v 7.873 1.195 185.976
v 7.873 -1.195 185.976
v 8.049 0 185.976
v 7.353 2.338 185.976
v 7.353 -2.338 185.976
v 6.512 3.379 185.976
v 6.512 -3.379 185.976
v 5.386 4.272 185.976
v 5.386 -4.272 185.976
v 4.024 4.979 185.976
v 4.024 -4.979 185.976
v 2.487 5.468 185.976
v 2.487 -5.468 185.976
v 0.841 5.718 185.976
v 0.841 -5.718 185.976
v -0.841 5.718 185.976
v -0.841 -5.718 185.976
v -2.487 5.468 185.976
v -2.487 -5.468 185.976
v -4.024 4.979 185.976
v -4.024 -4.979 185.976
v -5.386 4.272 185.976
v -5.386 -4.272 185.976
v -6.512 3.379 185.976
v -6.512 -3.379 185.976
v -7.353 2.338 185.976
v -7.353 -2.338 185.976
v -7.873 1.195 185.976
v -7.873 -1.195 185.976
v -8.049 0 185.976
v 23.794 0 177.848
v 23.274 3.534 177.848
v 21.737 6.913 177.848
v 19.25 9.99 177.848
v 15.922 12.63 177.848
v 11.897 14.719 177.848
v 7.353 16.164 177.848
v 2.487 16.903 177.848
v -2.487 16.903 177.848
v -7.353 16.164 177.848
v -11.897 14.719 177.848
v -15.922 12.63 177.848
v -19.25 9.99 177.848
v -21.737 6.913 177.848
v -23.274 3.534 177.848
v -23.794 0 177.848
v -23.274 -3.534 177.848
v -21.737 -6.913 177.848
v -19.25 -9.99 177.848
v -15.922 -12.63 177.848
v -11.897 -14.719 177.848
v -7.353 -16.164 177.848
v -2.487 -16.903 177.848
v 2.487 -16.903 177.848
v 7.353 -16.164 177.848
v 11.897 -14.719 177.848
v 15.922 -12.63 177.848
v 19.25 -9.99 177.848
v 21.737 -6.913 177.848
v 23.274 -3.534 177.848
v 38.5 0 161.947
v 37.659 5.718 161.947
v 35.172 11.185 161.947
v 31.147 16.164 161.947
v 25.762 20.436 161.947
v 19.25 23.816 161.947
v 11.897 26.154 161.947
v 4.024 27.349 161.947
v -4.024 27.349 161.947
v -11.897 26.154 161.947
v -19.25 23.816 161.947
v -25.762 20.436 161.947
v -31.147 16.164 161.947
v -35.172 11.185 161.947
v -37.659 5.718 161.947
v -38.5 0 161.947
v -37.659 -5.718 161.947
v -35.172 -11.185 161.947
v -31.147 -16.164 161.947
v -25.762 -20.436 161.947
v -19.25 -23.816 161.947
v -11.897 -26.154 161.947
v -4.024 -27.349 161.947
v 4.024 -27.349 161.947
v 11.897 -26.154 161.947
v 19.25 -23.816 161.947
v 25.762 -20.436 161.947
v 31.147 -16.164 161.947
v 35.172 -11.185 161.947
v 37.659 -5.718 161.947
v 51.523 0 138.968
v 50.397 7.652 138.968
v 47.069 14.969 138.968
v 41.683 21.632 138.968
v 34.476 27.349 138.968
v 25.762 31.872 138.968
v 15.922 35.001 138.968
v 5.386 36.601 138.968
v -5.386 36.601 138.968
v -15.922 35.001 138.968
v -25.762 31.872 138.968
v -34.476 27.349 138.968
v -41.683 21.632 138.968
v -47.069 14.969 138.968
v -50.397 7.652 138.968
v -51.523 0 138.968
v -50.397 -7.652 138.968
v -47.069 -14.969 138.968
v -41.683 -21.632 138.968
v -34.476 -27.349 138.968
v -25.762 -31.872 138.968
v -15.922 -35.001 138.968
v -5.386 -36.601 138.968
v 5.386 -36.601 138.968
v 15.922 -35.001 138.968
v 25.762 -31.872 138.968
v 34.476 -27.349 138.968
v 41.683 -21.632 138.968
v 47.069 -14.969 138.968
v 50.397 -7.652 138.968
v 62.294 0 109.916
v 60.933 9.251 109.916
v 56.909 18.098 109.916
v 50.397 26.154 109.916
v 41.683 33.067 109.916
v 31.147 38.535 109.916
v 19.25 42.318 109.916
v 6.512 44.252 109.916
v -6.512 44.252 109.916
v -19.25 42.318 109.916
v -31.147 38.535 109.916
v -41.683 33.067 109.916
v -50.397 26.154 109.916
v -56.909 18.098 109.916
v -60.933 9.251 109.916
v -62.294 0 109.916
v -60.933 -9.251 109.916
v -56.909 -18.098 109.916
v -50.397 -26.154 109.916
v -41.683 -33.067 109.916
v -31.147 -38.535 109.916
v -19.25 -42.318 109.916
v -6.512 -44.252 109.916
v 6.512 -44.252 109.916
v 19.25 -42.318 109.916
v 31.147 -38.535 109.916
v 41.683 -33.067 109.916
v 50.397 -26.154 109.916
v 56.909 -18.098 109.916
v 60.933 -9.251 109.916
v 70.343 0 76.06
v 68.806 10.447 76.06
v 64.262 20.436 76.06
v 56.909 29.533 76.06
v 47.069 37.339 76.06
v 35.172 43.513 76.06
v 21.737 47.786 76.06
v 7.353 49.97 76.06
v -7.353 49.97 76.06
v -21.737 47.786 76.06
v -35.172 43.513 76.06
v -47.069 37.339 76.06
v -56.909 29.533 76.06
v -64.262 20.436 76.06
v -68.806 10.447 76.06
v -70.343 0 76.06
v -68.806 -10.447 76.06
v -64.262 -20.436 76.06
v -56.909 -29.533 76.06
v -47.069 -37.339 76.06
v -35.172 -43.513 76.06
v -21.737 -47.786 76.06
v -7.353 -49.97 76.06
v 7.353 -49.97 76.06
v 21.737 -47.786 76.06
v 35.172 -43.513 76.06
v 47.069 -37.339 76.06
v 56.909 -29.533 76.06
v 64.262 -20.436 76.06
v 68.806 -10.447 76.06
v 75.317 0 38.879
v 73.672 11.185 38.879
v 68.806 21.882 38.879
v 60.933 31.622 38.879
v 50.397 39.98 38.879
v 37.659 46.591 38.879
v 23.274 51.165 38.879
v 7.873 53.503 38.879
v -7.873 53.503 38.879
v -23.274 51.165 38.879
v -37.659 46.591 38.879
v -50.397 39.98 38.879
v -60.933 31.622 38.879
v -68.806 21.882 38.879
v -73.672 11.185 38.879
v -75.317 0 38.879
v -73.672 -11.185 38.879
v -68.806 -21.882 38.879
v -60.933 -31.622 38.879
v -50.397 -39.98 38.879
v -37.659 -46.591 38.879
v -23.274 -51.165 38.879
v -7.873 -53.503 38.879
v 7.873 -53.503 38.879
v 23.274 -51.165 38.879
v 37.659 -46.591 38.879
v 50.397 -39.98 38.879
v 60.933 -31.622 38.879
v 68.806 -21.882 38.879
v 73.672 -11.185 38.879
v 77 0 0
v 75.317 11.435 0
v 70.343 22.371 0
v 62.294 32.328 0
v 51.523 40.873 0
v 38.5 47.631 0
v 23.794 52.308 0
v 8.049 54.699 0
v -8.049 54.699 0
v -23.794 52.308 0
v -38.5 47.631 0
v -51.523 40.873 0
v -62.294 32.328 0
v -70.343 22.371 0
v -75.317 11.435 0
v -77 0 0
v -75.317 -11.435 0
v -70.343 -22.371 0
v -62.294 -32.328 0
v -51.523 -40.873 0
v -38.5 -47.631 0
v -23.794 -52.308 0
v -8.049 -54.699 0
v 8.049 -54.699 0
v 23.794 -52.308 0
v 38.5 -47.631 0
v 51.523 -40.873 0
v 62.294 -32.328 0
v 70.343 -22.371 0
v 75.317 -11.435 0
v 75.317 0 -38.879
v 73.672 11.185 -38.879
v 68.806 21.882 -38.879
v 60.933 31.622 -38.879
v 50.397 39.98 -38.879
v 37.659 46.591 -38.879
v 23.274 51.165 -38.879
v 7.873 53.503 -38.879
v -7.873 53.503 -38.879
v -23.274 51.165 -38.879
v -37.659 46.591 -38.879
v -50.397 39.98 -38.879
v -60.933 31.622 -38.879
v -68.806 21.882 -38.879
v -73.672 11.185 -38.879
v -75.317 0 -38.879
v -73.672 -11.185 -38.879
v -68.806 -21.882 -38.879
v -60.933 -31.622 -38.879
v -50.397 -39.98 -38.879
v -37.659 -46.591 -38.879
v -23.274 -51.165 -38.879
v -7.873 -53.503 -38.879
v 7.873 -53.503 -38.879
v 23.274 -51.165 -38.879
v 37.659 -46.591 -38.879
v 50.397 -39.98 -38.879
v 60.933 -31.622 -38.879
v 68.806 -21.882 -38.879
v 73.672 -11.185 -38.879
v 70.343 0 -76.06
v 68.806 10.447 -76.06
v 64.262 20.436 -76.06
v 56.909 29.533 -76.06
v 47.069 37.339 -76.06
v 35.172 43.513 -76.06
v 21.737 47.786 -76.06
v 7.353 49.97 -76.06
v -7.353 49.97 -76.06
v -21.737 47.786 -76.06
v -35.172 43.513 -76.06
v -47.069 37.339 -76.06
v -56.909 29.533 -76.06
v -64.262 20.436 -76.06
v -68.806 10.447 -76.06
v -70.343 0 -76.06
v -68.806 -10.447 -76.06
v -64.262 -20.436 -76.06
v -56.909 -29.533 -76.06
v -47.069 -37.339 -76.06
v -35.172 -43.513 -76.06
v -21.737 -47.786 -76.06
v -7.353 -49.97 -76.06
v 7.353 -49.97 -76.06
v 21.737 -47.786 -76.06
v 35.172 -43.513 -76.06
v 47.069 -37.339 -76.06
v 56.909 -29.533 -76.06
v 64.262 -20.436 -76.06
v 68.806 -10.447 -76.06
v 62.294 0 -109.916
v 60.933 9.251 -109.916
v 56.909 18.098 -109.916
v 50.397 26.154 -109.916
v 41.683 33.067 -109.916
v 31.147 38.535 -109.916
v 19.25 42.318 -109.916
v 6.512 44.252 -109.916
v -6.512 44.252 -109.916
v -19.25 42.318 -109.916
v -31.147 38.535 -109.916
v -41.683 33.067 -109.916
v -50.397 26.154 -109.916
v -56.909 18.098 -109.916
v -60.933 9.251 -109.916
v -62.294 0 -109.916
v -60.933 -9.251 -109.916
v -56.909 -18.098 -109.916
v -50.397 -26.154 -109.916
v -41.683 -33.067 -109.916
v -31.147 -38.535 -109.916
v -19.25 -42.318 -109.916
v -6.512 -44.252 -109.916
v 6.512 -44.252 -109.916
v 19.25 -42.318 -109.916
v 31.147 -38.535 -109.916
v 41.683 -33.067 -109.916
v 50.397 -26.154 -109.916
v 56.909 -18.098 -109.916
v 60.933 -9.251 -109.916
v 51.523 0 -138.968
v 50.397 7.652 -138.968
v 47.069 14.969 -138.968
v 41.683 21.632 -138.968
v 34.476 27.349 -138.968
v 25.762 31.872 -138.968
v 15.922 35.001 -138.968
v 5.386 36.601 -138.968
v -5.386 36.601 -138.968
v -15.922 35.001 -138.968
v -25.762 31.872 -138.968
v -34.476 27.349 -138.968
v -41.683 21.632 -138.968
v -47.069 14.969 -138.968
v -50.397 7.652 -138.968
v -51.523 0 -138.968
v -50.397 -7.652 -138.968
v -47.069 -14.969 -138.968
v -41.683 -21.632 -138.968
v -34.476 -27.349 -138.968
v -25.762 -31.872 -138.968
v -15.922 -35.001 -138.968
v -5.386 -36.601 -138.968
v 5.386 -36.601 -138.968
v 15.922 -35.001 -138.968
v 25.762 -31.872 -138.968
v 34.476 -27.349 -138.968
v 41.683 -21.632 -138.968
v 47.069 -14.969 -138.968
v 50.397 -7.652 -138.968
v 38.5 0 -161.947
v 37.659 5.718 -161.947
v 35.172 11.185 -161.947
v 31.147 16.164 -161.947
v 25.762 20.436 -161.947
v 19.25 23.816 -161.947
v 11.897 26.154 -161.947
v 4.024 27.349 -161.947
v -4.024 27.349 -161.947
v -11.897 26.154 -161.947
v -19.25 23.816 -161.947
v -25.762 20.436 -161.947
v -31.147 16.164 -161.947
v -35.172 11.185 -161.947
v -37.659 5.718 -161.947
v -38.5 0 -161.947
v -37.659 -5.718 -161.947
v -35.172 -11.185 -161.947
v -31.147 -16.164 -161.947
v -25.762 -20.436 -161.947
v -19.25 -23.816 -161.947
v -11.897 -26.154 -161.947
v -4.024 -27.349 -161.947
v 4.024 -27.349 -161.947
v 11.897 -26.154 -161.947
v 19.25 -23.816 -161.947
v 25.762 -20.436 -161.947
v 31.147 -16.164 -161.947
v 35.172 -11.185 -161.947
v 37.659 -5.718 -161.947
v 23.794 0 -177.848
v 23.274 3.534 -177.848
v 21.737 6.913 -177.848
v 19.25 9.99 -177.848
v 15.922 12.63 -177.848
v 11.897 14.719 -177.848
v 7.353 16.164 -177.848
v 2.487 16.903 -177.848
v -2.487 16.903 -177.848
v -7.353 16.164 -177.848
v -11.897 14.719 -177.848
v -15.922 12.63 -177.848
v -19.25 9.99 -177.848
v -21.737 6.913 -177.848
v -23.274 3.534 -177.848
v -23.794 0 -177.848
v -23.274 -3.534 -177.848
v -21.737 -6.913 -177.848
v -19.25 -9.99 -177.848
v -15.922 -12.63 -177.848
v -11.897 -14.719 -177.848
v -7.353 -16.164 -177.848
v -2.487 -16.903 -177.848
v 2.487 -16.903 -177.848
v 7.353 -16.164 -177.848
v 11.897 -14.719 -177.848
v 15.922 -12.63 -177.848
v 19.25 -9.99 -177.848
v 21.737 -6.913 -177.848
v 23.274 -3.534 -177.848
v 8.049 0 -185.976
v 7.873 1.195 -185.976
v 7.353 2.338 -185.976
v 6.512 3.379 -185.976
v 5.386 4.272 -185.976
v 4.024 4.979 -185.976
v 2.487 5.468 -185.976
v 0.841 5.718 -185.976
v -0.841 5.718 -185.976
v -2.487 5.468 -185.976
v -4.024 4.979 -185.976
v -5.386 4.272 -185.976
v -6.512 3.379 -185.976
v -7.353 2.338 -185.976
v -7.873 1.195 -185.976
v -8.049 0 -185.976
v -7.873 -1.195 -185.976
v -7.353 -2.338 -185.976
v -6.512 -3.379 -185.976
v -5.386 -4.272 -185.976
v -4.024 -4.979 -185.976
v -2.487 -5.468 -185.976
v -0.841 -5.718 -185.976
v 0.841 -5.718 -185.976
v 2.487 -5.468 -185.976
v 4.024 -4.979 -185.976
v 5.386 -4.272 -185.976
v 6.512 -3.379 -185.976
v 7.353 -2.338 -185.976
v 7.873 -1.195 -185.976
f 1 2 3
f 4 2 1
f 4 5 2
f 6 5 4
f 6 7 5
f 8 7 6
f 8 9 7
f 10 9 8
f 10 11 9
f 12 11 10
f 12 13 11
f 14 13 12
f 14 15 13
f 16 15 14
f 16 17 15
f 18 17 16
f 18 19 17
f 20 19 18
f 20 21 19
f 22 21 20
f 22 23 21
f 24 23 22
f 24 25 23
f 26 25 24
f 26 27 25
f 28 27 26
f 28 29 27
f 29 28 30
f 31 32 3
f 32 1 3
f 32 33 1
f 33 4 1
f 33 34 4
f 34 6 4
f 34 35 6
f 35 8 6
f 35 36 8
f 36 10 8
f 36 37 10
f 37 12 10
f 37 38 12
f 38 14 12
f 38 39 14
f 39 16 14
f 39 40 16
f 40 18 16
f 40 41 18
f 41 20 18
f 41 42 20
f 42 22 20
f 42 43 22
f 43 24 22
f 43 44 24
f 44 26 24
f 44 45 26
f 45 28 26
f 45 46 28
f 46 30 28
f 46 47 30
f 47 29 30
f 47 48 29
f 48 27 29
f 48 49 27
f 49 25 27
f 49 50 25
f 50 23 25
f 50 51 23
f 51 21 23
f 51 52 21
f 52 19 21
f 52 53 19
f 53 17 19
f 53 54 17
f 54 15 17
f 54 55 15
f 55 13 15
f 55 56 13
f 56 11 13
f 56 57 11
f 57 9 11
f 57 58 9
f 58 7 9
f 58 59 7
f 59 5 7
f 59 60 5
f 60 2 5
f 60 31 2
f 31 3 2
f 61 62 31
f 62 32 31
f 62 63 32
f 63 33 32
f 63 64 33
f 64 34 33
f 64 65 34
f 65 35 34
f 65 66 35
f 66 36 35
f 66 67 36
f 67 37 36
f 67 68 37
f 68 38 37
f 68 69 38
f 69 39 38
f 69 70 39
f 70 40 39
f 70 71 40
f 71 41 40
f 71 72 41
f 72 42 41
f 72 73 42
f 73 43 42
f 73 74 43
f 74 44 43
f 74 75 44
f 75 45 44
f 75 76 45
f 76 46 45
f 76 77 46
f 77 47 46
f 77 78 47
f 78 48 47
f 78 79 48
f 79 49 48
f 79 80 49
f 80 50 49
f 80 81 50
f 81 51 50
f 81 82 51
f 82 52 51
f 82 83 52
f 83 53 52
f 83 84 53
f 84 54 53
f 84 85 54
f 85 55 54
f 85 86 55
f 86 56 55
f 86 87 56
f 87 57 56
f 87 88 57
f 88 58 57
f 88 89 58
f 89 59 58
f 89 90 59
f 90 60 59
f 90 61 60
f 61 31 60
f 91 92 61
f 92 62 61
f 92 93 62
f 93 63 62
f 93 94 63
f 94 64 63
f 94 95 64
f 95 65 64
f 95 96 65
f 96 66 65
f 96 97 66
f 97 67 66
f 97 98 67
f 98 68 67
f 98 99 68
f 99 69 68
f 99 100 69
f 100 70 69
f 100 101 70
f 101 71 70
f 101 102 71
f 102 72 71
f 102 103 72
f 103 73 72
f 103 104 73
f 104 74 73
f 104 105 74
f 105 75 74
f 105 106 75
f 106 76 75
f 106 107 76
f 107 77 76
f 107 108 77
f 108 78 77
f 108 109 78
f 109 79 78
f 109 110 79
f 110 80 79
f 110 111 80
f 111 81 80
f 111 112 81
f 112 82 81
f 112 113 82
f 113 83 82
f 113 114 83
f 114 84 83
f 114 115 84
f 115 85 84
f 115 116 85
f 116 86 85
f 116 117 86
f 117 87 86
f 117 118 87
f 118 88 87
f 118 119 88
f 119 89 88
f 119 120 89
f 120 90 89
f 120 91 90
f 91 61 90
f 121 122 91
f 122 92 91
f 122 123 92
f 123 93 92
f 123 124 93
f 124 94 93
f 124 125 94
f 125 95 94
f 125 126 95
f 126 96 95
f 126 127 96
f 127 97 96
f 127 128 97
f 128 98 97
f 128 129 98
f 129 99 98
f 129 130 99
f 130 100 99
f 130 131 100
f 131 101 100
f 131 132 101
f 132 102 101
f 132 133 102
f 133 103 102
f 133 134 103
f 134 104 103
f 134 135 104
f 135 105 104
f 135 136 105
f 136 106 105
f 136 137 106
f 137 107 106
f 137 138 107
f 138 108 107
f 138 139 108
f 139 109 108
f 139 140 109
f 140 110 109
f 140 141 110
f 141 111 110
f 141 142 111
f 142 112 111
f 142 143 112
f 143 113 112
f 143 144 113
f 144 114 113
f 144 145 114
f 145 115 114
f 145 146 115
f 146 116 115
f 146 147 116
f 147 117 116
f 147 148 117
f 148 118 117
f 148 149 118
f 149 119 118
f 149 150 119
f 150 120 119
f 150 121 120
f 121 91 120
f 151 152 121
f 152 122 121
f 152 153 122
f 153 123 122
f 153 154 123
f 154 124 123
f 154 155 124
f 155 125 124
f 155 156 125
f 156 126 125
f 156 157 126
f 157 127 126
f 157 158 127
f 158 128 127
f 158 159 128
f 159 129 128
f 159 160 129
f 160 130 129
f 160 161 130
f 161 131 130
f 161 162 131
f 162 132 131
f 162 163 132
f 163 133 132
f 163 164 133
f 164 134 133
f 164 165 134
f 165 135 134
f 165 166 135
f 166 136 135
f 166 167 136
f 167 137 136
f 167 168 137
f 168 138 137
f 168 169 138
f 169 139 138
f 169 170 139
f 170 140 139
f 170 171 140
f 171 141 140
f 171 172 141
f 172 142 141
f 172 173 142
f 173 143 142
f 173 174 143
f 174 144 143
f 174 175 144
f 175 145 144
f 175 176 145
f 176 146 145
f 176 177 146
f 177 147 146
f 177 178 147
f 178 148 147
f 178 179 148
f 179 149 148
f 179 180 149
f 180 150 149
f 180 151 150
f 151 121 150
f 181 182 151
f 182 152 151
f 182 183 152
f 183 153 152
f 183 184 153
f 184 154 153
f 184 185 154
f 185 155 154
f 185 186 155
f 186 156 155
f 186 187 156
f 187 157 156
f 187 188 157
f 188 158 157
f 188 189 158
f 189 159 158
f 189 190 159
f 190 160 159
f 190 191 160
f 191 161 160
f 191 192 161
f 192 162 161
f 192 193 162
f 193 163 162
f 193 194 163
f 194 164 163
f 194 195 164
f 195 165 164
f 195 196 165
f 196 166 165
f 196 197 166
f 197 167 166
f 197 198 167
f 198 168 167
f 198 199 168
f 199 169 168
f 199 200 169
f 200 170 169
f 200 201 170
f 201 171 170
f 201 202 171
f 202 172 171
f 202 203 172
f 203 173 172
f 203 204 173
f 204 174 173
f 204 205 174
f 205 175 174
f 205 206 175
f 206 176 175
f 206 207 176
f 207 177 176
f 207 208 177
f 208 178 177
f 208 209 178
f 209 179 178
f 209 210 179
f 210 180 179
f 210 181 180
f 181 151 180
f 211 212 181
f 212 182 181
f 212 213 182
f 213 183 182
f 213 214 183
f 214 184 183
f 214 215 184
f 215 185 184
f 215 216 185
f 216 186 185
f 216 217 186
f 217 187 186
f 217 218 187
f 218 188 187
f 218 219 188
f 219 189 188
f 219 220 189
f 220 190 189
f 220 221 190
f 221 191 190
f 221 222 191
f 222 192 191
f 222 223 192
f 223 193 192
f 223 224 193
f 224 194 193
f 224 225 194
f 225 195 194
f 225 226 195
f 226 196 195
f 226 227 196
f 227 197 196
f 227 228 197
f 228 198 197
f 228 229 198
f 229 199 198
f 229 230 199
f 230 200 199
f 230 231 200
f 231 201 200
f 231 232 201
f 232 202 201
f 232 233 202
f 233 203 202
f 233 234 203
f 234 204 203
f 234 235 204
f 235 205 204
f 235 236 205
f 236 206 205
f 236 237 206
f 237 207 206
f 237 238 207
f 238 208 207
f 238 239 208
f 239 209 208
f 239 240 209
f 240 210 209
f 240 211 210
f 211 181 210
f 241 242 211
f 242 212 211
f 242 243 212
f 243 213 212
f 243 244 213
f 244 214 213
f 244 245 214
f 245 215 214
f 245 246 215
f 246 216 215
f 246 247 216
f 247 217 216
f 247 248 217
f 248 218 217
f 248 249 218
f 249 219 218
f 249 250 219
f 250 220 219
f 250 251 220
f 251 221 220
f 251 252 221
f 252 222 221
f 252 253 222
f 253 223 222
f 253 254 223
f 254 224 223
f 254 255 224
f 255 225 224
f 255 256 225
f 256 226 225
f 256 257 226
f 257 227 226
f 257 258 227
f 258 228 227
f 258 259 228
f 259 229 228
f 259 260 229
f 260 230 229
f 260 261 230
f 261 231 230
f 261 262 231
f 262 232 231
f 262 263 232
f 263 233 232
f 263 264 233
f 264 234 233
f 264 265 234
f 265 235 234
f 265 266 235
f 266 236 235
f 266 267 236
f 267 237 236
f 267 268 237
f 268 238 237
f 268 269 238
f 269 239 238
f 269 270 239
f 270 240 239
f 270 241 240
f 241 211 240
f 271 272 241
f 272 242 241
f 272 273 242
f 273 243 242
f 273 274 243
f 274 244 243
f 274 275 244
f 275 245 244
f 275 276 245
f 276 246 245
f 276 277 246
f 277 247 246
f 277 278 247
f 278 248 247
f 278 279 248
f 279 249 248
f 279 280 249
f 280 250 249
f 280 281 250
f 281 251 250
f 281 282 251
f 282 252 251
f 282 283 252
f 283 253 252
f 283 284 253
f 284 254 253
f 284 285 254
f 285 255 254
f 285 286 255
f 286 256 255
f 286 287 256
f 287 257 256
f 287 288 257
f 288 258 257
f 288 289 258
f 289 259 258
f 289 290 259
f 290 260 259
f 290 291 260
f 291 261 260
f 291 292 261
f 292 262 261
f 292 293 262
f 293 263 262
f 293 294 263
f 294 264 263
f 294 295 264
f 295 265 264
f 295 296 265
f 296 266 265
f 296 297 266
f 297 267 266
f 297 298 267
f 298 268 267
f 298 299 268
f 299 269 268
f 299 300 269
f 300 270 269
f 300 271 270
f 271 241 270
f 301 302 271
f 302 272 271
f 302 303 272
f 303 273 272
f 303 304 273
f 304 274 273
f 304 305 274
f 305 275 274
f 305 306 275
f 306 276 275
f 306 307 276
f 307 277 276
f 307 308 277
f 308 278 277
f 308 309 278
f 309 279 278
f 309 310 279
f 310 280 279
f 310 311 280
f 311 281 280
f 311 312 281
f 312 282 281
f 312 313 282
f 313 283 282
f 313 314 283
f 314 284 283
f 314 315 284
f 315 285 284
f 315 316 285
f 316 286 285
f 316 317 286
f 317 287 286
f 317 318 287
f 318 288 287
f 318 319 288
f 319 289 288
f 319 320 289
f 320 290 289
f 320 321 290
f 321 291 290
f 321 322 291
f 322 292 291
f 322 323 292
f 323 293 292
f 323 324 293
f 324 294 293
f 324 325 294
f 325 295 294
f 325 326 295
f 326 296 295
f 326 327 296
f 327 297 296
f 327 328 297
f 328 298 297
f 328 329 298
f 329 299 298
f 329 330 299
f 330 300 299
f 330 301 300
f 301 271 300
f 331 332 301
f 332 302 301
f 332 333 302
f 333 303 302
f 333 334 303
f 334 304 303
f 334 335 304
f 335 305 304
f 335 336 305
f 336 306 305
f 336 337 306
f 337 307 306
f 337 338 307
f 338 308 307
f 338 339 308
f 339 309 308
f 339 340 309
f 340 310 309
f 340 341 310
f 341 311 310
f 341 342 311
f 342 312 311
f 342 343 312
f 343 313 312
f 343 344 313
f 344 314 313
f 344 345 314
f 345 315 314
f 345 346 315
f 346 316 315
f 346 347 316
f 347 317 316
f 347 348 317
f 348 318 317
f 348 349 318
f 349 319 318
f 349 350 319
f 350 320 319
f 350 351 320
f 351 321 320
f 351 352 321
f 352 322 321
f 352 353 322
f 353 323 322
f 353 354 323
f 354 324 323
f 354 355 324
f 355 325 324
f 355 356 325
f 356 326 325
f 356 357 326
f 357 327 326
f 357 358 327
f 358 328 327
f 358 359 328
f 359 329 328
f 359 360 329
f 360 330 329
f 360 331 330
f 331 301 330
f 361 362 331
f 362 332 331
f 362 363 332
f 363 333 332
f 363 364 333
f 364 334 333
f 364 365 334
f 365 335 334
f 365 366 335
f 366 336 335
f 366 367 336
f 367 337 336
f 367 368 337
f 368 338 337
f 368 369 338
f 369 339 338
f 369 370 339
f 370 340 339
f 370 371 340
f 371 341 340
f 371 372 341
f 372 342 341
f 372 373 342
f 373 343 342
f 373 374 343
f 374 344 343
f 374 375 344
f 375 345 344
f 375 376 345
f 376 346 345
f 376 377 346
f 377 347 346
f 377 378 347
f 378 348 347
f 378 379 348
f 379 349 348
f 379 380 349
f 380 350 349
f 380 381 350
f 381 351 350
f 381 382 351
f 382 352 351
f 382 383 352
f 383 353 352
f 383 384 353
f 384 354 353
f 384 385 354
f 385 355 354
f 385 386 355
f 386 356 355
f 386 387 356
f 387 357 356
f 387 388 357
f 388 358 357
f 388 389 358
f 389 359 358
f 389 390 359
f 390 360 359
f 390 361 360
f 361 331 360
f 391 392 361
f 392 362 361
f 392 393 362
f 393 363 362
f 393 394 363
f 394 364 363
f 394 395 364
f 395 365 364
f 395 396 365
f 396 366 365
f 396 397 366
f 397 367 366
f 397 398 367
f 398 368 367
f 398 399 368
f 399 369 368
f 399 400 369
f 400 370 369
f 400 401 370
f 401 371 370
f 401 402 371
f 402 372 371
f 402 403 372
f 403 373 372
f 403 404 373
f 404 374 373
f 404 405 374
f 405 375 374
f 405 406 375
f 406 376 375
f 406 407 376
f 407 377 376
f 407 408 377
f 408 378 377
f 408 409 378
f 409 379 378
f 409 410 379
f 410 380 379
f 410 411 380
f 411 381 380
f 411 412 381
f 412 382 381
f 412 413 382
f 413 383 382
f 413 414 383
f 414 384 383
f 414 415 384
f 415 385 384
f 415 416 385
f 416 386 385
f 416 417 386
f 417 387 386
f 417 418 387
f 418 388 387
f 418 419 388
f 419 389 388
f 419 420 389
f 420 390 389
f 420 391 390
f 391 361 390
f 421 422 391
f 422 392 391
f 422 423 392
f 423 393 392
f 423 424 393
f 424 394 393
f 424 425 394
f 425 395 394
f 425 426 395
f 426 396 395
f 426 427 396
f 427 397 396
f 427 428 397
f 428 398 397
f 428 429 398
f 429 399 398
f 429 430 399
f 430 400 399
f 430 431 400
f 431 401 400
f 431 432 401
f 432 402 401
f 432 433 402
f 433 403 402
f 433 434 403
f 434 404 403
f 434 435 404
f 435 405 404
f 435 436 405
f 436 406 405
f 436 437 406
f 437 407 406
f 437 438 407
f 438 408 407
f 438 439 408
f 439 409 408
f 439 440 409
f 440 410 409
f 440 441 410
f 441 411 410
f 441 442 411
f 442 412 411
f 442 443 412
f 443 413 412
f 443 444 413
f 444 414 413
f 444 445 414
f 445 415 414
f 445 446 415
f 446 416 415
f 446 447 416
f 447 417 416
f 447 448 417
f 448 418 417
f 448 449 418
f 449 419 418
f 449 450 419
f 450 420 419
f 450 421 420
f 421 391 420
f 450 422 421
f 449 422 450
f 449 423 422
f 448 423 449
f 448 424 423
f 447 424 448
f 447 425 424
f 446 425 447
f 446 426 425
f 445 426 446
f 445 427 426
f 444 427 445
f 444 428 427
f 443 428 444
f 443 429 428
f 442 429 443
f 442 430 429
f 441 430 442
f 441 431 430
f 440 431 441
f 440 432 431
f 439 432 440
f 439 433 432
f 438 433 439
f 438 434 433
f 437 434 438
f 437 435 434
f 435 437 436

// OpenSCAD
// Generated by SolidPython 1.0.1 on 2020-07-29 00:46:47


scale(v = [7, 5, 17]) {
	sphere(r = 11);
}
/***********************************************
*********      SolidPython code:      **********
************************************************
 
# import packages: SolidPython
from solid import *
from solid.utils import *
from itertools import chain, combinations, permutations


class Resize:

    def __init__(self, scad_file):
        self.scad_file = scad_file
        #self.scad_file = import_scad(scad_file)
        # cone/cylinder param:
        self.r1 = 0
        self.r2 = 0
        self.h = 0
        # rectangular prism param:
        self.w = 0
        self.l = 0
        # ellipse param:
        self.r = 0

    # import OpenScad code (file name corresponds to shape)


    # classify shape + parameters
    def assign(self, param1, param2, param3):
        if self.scad_file == 'cone.scad':
            self.r1 = param1
            self.r2 = param2
            self.h = param3
        elif self.scad_file == 'cylinder.scad':
            self.r1 = param1
            self.r2 = param2
            self.h = param3
        elif self.scad_file == 'rectangularPrism.scad':
            self.h = param1
            self.l = param2
            self.w = param3
        else:
            self.r = param1
            self.h = param2

    # resize parameters
    def iterate(self):
        x = range(3, 20, 2)
        i = 1
        if self.scad_file == 'cone.scad':
            tempList = list(permutations(x, 2))
            for temp in tempList:
                param1 = temp[0]
                param2 = temp[1]
                filepath = 'produced_scad_files/' + 'cone' + str(param1) + '_' + str(param2) + '_' + '.scad'
                scad_render_to_file(cylinder(h=param1, r1=param2, r2=0), filepath)

        elif self.scad_file == 'cylinder.scad':
            tempList = list(permutations(x, 3))
            for temp in tempList:
                param1 = temp[0]
                param2 = temp[1]
                filepath = 'produced_scad_files/' + 'cylinder' + str(param1) + '_' + str(param2) + '_' + '.scad'
                scad_render_to_file(cylinder(h=param1, r1=param2, r2=param2), filepath)

        elif self.scad_file == 'rectangularPrism.scad':
            tempList = list(permutations(x, 3))
            for temp in tempList:
                param1 = temp[0]
                param2 = temp[1]
                param3 = temp[2]
                filepath = 'produced_scad_files/' + 'rectangularPrism' + str(param1) + '_' + str(param2) + '_' + str(
                    param3) + '.scad'
                scad_render_to_file(cube(size=(param1, param2, param3)), filepath)

        elif self.scad_file == 'ellipse.scad':
            tempList = list(permutations(x, 4))
            for temp in tempList:
                param1 = temp[0]
                param2 = temp[1]
                param3 = temp[2]
                param4 = temp[3]
                filepath = 'produced_scad_files/' + 'ellipse' + str(param1) + '_' + str(param2) + '_' + str(param3) + '_' + str(param4) + '.scad'
                scad_render_to_file(scale([param1, param2, param3])(sphere(r=param4)), filepath)

    def render_to_scadfile(self):
        scad_render_to_file(scad, 'example.scad') 
 
************************************************/
